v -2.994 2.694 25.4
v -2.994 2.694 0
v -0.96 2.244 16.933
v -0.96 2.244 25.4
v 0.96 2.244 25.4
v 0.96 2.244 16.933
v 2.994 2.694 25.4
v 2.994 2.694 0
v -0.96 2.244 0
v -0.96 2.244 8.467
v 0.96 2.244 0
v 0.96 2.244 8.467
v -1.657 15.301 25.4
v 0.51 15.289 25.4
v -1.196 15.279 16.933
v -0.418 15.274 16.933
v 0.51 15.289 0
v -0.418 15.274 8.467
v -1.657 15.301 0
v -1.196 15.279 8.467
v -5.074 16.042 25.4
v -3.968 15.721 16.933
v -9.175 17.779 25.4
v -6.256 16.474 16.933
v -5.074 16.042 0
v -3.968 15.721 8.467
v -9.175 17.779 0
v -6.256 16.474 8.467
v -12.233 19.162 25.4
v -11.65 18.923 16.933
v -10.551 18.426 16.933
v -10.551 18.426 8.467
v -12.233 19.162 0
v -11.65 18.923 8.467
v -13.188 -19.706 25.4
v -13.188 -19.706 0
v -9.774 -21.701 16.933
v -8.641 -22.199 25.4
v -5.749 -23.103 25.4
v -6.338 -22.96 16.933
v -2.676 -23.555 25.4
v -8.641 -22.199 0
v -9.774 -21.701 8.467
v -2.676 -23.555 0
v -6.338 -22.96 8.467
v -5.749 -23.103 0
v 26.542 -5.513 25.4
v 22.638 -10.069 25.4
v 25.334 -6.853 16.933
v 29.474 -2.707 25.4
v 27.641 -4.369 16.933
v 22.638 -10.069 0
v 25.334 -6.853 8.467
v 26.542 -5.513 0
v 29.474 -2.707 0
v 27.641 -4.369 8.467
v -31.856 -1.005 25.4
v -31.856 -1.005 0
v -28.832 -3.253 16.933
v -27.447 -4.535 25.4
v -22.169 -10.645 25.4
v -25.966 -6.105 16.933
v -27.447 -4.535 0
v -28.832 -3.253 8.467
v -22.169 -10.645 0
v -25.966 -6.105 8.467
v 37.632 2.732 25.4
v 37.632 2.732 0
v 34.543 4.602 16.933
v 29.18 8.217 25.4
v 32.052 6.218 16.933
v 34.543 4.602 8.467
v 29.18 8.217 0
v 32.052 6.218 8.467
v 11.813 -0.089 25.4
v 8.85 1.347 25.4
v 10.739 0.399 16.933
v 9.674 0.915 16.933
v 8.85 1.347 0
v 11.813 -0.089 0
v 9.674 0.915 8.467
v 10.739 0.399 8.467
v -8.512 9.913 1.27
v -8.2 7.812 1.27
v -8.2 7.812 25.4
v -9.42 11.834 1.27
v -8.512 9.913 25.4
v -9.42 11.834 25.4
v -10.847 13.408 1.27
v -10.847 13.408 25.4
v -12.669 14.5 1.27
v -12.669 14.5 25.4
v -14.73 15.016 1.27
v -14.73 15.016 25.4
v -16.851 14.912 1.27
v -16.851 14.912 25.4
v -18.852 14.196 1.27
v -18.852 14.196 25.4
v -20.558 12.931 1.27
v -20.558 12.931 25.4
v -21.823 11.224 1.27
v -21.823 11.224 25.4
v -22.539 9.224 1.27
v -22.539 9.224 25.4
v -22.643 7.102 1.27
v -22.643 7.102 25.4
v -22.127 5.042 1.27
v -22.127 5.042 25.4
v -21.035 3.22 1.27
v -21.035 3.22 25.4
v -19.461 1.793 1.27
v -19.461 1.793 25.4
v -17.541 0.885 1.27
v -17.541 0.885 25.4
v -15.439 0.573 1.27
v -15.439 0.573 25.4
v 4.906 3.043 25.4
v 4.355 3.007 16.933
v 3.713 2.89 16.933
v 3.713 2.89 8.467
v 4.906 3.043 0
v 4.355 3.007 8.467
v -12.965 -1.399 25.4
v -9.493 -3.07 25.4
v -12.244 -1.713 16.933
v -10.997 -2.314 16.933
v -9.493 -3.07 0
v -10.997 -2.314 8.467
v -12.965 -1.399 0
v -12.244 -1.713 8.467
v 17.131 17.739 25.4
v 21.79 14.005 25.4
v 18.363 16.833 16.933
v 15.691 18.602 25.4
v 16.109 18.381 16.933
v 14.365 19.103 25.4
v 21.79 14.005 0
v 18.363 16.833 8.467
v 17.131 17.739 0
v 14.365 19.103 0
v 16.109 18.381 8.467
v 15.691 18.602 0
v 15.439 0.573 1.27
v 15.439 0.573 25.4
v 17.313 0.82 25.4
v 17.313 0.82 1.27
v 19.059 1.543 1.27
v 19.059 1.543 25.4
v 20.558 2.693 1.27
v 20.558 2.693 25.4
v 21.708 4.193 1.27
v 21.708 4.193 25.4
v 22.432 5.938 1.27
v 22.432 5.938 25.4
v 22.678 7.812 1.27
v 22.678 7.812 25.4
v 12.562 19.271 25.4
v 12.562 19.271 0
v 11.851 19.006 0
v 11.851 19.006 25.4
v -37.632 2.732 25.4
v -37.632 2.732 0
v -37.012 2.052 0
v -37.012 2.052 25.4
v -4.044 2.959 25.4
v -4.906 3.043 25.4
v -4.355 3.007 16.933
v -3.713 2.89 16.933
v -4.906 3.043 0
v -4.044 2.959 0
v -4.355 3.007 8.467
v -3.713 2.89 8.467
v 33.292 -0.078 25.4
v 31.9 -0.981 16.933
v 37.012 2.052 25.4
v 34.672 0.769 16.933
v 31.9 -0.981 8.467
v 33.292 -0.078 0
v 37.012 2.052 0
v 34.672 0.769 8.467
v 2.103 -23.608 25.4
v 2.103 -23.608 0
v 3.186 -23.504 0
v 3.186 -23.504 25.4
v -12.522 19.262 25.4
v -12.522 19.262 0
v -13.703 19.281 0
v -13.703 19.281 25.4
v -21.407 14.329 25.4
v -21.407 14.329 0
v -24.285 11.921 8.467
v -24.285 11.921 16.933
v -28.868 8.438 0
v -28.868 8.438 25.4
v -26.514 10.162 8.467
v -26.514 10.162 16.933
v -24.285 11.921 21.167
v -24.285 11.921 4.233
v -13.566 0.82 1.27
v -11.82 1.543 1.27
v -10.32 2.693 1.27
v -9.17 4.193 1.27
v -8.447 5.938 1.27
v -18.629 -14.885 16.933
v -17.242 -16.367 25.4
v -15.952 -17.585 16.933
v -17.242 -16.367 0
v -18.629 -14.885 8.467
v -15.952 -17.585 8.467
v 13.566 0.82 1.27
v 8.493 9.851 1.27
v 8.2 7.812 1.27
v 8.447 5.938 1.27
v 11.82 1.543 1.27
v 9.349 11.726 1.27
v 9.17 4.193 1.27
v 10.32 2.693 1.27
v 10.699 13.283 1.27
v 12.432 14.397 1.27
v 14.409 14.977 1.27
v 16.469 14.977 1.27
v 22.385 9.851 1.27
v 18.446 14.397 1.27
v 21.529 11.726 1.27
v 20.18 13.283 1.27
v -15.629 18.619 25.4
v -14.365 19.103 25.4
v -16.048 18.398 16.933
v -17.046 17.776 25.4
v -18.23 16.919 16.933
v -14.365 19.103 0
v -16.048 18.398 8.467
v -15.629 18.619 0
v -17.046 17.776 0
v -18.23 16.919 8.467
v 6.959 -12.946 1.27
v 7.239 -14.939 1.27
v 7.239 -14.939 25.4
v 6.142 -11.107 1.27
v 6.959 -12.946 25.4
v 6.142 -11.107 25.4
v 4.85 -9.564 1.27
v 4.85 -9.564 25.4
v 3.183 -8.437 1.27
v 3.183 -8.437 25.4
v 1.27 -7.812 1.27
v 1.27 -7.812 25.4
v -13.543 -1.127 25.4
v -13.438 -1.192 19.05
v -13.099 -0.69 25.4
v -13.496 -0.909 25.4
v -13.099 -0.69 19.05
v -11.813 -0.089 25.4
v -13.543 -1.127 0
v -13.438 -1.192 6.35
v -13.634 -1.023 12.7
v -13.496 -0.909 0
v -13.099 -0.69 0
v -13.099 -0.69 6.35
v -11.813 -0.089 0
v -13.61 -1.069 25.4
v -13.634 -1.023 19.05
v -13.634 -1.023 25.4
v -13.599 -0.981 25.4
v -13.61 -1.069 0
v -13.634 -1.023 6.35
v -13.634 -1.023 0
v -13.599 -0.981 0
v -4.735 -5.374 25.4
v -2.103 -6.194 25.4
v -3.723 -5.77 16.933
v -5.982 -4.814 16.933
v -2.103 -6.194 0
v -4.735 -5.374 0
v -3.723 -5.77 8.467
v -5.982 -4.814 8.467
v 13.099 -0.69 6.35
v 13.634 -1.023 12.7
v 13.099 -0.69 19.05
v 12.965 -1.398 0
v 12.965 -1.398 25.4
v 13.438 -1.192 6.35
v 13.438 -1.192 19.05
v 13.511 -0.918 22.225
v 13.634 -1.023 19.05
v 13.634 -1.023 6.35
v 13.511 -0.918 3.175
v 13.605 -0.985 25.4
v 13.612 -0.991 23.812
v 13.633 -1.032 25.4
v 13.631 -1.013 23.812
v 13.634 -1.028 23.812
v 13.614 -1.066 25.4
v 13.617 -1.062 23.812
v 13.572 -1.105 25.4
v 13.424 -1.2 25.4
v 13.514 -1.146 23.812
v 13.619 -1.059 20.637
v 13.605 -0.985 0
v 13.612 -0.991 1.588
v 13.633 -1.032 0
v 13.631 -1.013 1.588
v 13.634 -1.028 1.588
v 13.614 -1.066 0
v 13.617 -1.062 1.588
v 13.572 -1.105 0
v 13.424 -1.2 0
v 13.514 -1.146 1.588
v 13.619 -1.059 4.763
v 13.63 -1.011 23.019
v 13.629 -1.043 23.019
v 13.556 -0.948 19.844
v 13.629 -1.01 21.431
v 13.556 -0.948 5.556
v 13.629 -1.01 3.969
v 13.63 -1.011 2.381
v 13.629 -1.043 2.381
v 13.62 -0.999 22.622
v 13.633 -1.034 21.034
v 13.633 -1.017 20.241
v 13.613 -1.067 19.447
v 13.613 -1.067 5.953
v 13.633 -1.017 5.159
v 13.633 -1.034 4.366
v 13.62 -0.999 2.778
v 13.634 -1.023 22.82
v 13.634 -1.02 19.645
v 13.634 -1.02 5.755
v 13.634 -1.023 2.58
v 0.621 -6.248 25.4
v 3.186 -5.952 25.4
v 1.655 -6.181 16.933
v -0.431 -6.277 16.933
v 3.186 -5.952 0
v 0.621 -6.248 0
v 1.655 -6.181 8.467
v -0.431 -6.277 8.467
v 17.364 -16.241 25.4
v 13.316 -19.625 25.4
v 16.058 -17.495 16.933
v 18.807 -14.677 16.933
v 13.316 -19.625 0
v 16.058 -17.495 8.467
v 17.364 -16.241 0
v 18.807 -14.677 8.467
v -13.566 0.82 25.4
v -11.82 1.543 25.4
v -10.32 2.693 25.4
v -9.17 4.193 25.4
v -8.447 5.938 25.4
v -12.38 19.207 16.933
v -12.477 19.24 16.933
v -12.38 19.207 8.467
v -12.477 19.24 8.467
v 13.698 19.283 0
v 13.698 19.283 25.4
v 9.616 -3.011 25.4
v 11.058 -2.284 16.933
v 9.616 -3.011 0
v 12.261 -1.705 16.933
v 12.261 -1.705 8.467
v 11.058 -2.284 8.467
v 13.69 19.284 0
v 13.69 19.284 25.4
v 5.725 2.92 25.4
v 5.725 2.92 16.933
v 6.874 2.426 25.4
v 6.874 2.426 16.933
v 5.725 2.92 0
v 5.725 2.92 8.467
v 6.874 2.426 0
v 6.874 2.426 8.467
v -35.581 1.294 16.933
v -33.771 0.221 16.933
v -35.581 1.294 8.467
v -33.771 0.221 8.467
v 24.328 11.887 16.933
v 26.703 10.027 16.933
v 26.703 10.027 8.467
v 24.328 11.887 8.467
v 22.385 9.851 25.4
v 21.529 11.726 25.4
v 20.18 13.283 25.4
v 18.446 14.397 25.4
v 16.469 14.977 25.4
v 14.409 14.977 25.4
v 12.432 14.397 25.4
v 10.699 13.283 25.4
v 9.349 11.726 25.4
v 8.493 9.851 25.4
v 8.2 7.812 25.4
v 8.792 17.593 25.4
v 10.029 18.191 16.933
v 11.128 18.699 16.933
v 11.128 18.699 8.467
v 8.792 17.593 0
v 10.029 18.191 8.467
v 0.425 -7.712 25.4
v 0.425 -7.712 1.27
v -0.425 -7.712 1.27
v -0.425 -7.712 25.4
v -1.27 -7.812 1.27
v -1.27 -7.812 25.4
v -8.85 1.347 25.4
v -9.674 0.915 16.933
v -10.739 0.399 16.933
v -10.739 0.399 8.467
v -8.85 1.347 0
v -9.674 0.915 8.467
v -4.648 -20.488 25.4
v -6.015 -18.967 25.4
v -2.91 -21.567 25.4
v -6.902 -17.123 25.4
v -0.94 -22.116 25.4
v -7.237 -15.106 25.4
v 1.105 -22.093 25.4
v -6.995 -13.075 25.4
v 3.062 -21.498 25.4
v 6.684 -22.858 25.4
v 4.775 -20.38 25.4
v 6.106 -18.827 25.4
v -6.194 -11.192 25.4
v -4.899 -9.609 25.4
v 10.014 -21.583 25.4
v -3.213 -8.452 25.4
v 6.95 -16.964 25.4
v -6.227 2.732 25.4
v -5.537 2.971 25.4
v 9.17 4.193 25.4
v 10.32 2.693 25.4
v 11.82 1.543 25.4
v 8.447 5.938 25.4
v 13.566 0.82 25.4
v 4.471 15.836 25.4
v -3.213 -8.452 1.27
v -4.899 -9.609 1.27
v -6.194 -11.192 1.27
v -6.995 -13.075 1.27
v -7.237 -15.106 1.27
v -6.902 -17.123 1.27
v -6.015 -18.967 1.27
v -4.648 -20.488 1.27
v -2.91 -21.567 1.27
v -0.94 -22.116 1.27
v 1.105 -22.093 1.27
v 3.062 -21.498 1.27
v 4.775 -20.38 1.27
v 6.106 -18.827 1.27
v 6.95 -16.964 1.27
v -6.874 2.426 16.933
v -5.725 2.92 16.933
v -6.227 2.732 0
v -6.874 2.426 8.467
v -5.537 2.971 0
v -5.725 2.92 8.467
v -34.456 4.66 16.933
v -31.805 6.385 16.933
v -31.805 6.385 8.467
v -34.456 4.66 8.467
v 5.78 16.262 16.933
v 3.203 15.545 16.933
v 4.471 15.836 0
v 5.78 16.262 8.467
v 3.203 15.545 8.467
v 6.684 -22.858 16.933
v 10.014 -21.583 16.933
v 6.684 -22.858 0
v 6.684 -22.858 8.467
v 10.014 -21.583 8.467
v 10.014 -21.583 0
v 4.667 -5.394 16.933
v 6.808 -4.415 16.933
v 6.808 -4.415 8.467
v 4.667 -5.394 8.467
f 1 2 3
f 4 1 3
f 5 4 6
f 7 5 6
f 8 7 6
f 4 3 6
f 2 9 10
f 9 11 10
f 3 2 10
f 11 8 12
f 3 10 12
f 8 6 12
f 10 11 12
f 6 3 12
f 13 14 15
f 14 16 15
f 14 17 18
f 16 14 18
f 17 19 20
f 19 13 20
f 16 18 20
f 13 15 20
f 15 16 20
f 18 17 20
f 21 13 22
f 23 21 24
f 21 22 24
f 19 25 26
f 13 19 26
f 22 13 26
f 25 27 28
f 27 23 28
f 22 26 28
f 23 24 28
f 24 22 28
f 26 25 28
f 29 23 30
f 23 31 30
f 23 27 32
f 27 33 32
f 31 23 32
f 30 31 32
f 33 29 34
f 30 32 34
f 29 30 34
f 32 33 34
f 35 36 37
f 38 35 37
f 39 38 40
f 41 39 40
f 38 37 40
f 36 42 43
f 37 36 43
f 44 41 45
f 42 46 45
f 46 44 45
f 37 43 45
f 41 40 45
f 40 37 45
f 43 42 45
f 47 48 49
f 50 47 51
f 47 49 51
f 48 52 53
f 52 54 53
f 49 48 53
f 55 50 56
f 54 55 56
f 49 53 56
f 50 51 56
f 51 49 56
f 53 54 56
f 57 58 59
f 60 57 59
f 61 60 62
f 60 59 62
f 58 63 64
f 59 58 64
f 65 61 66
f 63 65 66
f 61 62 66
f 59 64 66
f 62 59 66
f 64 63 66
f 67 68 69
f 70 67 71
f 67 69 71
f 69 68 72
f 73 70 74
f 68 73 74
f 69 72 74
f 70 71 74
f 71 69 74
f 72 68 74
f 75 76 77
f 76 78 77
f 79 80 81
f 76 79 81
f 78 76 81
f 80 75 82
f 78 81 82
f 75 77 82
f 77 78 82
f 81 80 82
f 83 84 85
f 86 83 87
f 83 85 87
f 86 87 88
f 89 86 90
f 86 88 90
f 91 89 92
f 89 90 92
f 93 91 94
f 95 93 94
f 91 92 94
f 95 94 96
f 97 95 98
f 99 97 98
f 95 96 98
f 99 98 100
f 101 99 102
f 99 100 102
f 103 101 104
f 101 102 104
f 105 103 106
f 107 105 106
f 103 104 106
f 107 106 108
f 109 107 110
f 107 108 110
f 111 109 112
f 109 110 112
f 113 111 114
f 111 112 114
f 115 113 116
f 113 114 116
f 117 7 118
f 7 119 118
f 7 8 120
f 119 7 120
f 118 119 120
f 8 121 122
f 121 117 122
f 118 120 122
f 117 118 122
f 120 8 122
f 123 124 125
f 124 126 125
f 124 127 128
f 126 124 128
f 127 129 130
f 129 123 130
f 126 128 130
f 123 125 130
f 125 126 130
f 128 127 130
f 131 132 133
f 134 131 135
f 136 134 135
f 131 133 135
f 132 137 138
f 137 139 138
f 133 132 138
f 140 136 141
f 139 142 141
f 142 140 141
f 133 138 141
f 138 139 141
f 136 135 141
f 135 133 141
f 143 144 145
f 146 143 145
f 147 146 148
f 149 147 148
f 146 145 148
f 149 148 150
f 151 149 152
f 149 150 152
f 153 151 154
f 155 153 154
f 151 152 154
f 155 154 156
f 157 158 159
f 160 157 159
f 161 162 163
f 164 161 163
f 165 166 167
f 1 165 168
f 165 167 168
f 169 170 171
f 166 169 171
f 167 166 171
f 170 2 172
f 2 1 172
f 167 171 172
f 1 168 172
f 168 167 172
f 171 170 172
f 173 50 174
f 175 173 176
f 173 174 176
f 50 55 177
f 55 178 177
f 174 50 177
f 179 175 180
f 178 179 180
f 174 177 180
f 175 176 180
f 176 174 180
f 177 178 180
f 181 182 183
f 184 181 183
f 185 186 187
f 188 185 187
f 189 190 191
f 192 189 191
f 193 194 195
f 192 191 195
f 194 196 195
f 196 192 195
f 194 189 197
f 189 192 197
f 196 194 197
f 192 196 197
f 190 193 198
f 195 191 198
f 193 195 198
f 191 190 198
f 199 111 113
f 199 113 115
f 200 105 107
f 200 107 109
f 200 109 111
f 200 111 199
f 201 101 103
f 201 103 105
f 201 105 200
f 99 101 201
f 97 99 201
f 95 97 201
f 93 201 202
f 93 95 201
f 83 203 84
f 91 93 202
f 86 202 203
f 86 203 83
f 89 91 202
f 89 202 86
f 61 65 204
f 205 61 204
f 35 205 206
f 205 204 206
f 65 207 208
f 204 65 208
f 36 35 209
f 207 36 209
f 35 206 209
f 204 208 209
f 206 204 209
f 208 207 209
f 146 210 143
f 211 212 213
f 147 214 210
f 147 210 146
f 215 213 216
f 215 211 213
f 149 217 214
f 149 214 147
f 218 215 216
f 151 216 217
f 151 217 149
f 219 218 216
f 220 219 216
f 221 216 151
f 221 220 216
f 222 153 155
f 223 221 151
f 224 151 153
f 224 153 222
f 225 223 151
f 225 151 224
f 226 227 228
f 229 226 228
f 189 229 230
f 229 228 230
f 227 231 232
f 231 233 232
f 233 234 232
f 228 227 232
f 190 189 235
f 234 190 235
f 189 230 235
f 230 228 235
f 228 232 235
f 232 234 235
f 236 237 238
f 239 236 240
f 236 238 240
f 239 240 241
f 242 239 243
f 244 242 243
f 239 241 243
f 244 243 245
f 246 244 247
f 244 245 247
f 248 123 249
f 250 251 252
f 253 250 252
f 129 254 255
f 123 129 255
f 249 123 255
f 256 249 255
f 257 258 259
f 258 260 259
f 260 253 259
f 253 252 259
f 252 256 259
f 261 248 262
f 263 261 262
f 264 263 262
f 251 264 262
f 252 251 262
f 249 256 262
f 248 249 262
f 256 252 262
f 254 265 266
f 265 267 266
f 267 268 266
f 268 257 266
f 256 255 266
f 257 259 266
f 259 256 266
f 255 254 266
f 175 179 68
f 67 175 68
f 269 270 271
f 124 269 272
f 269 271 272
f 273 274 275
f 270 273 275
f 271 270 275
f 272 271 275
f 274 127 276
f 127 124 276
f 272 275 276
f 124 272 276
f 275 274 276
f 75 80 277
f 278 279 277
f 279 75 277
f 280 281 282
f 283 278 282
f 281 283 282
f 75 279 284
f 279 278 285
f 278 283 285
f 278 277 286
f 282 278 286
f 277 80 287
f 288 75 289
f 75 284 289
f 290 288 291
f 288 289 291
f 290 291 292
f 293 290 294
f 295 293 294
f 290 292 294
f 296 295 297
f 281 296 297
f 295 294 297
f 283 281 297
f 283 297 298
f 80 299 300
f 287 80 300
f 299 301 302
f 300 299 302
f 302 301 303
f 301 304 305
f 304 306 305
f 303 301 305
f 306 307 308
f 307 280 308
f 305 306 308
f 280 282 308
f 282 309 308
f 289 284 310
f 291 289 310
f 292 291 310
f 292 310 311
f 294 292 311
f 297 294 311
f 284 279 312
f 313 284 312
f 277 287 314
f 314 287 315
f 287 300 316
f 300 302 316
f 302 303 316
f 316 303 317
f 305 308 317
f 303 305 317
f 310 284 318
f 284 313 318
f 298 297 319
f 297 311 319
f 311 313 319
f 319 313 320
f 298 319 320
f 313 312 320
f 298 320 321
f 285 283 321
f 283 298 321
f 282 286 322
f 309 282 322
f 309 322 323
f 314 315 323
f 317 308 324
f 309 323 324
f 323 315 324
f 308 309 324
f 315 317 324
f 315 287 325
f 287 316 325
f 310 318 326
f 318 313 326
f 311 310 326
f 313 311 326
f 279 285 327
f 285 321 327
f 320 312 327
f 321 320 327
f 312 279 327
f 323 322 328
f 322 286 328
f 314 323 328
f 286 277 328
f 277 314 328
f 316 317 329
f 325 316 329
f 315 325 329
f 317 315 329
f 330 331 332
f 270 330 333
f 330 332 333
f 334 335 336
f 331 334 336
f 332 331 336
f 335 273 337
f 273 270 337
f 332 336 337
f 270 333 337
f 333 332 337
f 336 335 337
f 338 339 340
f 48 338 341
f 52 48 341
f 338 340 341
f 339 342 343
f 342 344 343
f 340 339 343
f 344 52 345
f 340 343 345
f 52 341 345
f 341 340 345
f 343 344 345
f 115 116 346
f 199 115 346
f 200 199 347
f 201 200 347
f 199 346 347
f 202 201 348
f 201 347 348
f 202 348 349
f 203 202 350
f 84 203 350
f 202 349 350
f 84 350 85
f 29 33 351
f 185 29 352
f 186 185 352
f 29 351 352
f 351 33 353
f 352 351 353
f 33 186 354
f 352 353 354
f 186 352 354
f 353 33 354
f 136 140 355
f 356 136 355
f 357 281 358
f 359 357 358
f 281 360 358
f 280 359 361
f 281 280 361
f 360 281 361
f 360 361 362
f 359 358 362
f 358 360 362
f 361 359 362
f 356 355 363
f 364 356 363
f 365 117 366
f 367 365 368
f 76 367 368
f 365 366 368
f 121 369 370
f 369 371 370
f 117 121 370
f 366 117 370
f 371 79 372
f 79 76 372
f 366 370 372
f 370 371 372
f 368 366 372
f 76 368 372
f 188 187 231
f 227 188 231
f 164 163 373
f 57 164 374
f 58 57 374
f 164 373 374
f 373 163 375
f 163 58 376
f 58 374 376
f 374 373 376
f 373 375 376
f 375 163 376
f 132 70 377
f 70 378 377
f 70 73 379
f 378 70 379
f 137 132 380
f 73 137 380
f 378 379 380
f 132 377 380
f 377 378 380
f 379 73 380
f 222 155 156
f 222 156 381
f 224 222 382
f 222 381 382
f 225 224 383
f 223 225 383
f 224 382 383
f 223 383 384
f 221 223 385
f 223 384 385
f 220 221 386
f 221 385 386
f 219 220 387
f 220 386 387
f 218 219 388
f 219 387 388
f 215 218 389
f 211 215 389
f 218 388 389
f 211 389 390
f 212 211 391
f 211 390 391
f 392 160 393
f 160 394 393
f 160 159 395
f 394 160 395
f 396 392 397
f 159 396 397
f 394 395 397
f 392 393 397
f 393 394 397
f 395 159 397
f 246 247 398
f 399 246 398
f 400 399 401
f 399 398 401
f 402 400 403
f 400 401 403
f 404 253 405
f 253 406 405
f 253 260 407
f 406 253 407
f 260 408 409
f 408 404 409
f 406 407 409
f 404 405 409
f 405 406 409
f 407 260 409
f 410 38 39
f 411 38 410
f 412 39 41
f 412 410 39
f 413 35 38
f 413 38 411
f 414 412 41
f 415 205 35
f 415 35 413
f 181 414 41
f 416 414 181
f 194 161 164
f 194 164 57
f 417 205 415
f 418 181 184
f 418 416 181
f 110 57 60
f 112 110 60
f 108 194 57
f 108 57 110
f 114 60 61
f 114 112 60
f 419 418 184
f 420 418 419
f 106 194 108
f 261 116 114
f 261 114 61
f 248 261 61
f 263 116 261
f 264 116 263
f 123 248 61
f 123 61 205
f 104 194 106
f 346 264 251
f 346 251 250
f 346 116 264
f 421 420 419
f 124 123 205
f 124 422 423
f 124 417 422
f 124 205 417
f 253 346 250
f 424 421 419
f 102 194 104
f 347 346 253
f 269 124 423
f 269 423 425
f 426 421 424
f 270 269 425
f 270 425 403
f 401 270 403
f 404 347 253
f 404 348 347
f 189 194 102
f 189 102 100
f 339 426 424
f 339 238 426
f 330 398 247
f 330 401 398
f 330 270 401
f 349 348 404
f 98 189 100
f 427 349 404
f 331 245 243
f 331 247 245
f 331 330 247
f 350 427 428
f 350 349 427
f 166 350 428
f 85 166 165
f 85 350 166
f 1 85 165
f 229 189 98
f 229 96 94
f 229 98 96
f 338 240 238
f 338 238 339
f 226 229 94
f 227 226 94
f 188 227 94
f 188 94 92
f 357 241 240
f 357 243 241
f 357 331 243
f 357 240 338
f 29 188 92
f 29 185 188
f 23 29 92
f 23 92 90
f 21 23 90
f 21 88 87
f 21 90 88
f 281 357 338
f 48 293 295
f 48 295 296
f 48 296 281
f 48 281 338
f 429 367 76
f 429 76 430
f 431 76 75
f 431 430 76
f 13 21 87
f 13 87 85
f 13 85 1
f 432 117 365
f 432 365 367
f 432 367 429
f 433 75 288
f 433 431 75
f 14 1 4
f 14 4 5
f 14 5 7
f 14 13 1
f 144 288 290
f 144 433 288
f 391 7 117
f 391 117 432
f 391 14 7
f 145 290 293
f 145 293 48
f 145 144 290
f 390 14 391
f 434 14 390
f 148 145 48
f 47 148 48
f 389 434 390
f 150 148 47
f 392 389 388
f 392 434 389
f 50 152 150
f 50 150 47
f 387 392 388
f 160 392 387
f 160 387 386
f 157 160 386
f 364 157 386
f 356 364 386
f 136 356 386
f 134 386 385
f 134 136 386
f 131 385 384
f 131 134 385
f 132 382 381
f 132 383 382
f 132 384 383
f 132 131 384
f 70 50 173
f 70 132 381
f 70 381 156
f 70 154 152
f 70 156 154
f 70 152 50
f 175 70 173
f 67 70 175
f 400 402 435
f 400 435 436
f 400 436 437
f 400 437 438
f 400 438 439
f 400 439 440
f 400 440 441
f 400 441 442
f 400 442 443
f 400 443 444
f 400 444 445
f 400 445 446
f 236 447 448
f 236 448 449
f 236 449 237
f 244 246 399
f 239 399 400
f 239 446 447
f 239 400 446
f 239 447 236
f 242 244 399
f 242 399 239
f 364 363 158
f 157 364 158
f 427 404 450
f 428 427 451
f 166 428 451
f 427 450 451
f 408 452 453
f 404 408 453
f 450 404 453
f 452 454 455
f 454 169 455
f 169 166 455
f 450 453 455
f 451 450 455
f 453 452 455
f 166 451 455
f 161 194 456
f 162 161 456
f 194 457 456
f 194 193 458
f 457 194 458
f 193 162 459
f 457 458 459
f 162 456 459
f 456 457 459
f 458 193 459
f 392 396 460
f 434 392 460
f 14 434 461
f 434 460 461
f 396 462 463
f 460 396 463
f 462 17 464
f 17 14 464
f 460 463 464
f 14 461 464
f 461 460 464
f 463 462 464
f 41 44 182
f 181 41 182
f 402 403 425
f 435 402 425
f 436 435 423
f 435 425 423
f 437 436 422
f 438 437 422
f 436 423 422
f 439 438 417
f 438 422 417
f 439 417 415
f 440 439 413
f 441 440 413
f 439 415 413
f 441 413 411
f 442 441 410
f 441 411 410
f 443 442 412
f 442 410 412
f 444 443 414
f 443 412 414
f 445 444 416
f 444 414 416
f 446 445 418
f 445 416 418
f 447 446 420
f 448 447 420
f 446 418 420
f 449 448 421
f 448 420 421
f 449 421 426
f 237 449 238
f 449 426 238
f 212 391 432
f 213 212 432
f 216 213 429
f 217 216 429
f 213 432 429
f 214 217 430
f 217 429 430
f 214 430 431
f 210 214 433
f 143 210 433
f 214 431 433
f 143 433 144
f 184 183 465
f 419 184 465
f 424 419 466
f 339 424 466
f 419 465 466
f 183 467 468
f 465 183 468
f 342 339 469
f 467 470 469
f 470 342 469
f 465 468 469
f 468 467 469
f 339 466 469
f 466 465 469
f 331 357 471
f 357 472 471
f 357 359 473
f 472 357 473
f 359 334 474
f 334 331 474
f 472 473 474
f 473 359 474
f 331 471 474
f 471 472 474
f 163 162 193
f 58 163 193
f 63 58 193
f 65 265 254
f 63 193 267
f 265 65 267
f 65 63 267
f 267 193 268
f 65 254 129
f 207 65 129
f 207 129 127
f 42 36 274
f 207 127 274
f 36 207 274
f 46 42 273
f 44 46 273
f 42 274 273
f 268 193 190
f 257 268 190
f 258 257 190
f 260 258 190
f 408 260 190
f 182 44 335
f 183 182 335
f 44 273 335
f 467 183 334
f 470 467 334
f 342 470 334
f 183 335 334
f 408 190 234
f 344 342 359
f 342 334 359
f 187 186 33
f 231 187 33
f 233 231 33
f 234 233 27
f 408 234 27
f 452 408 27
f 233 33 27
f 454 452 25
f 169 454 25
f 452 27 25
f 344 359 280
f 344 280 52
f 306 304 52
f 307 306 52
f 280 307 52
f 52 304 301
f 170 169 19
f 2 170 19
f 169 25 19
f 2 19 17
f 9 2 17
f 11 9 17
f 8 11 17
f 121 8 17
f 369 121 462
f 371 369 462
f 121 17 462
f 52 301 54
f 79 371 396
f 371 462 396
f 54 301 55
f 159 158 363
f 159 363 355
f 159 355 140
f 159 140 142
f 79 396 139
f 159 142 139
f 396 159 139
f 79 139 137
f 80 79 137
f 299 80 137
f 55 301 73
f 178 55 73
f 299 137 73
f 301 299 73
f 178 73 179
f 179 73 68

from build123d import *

# Parameters (mm, degrees)
F1_DEPTH = 25.4
F2_R     = 7.239
F3_DEPTH = 24.13


# Not quite as in the source:
# - ends of sketch curves that miss each other by under 0.0002 mm in the source are joined


with BuildPart() as f1:
    # F0 (on Top) → F1 (new body)
    with BuildSketch(Plane.XY):
        with BuildLine():
            add(Edge.make_bspline(
                [(-13.1884615385, -19.7055979293), (-9.7172457191, -22.0951789594), (-6.5189125485, -23.2662965046), (-2.6759197324, -23.5549250296)],
                knots=[0, 0, 0, 0, 1, 1, 1, 1], degree=3))
            Line((-2.6759197324, -23.5549250296), (2.1025083612, -23.6077884611))
            Line((2.1025083612, -23.6077884611), (3.1856187291, -23.5036646015))
            add(Edge.make_bspline(
                [(3.1856187291, -23.5036646015), (6.8168163211, -23.15457813), (9.9794896756, -21.9435460564), (13.3158862876, -19.6246398892)],
                knots=[0, 0, 0, 0, 1, 1, 1, 1], degree=3))
            add(Edge.make_bspline(
                [(13.3158862876, -19.6246398892), (16.4115571605, -17.4730475146), (17.9082372943, -15.9389605714), (22.6381101873, -10.0694262069)],
                knots=[0, 0, 0, 0, 1, 1, 1, 1], degree=3))
            add(Edge.make_bspline(
                [(22.6381101873, -10.0694262069), (25.5016513946, -6.5159182102), (27.9048694214, -3.927799227), (29.4743562341, -2.7072102972)],
                knots=[0, 0, 0, 0, 1, 1, 1, 1], degree=3))
            add(Edge.make_bspline(
                [(29.4743562341, -2.7072102972), (31.4678692876, -1.1568550363), (35.1474296689, 1.1661975322), (37.0124718161, 2.0519014787)],
                knots=[0, 0, 0, 0, 1, 1, 1, 1], degree=3))
            Line((37.0124718161, 2.0519014787), (37.6322441338, 2.7317278065))
            add(Edge.make_bspline(
                [(37.6322441338, 2.7317278065), (33.9167308595, 4.9403402078), (32.5687337458, 5.8151659035), (29.1802675585, 8.2169048474)],
                knots=[0, 0, 0, 0, 1, 1, 1, 1], degree=3))
            add(Edge.make_bspline(
                [(29.1802675585, 8.2169048474), (26.5643967391, 10.0710303571), (24.4979457592, 11.6894900051), (21.789632107, 14.0053073964)],
                knots=[0, 0, 0, 0, 1, 1, 1, 1], degree=3))
            add(Edge.make_bspline(
                [(21.789632107, 14.0053073964), (17.557108204, 17.6244421652), (16.0735171405, 18.6431407559), (14.3652864381, 19.1031879026)],
                knots=[0, 0, 0, 0, 1, 1, 1, 1], degree=3))
            Line((14.3652864381, 19.1031879026), (13.6981605351, 19.2828529762))
            Line((13.6981605351, 19.2828529762), (13.6904819746, 19.2842043089))
            Line((13.6904819746, 19.2842043089), (12.5617656785, 19.2709062892))
            Line((12.5617656785, 19.2709062892), (11.8505016722, 19.0057804423))
            add(Edge.make_bspline(
                [(11.8505016722, 19.0057804423), (11.394958194, 18.8359751773), (10.018770903, 18.2002029302), (8.7923076923, 17.5929531204)],
                knots=[0, 0, 0, 0, 1, 1, 1, 1], degree=3))
            add(Edge.make_bspline(
                [(8.7923076923, 17.5929531204), (5.3799595585, 15.9034224779), (3.4433187191, 15.3647120515), (0.5096989967, 15.2890007254)],
                knots=[0, 0, 0, 0, 1, 1, 1, 1], degree=3))
            add(Edge.make_bspline(
                [(0.5096989967, 15.2890007254), (-0.4364297659, 15.2645829578), (-1.411229097, 15.2701955402), (-1.6565217391, 15.3014730598)],
                knots=[0, 0, 0, 0, 1, 1, 1, 1], degree=3))
            add(Edge.make_bspline(
                [(-1.6565217391, 15.3014730598), (-4.1988442676, 15.625649745), (-5.7211355017, 16.1272113972), (-9.1745819398, 17.7785107923)],
                knots=[0, 0, 0, 0, 1, 1, 1, 1], degree=3))
            add(Edge.make_bspline(
                [(-9.1745819398, 17.7785107923), (-10.6112959866, 18.4654896305), (-11.9874832776, 19.0880385335), (-12.2327759197, 19.1619526928)],
                knots=[0, 0, 0, 0, 1, 1, 1, 1], degree=3))
            add(Edge.make_bspline(
                [(-12.2327759197, 19.1619526928), (-12.4038425542, 19.2135003349), (-12.5045889513, 19.2450051824), (-12.5224971626, 19.2615668616)],
                knots=[0, 0, 0, 0, 0.4016092701, 0.4016092701, 0.4016092701, 0.4016092701], degree=3))
            Line((-12.5224971626, 19.2615668616), (-13.7034814285, 19.2814199953))
            Line((-13.7034814285, 19.2814199953), (-14.3652864381, 19.1031879026))
            add(Edge.make_bspline(
                [(-14.3652864381, 19.1031879026), (-15.9654584047, 18.6722420201), (-17.5656112575, 17.5873902337), (-21.4073578595, 14.3288910786)],
                knots=[0, 0, 0, 0, 1, 1, 1, 1], degree=3))
            add(Edge.make_bspline(
                [(-21.4073578595, 14.3288910786), (-24.8686676789, 11.3930710494), (-26.1926326442, 10.347677133), (-28.8684434285, 8.4376666326)],
                knots=[0, 0, 0, 0, 1, 1, 1, 1], degree=3))
            add(Edge.make_bspline(
                [(-28.8684434285, 8.4376666326), (-32.2200301856, 6.0452835322), (-33.9212185999, 4.9376719336), (-37.6322438152, 2.7317278065)],
                knots=[0, 0, 0, 0, 1, 1, 1, 1], degree=3))
            Line((-37.6322438152, 2.7317278065), (-37.0124719753, 2.0519014787))
            add(Edge.make_bspline(
                [(-37.0124719753, 2.0519014787), (-35.8599579657, 1.5045752279), (-33.7339199875, 0.2440615757), (-31.856187291, -1.0052246818)],
                knots=[0, 0, 0, 0, 1, 1, 1, 1], degree=3))
            add(Edge.make_bspline(
                [(-31.856187291, -1.0052246818), (-28.3890610096, -3.3119617855), (-26.7945040146, -4.8987439594), (-22.168989602, -10.6451911133)],
                knots=[0, 0, 0, 0, 1, 1, 1, 1], degree=3))
            add(Edge.make_bspline(
                [(-22.168989602, -10.6451911133), (-17.8793743144, -15.9743400531), (-16.3129253077, -17.5547216818), (-13.1884615385, -19.7055979293)],
                knots=[0, 0, 0, 0, 1, 1, 1, 1], degree=3))
        make_face()
        with BuildLine():
            add(Edge.make_bspline(
                [(3.1856187291, -5.9524701801), (2.2569598997, -6.2331244644), (-0.9628468896, -6.3803357286), (-2.1025083612, -6.1942458992)],
                knots=[0, 0, 0, 0, 1, 1, 1, 1], degree=3))
            add(Edge.make_bspline(
                [(-2.1025083612, -6.1942458992), (-3.6078737659, -5.9484422838), (-5.1525675452, -5.2953738791), (-9.4931438127, -3.0696215748)],
                knots=[0, 0, 0, 0, 1, 1, 1, 1], degree=3))
            add(Edge.make_bspline(
                [(-9.4931438127, -3.0696215748), (-11.0349832776, -2.2789994276), (-12.5975292642, -1.5271169527), (-12.9654682274, -1.3987709226)],
                knots=[0, 0, 0, 0, 1, 1, 1, 1], degree=3))
            add(Edge.make_bspline(
                [(-12.9654682274, -1.3987709226), (-13.3334071906, -1.2704261668), (-13.6344481605, -1.1015348557), (-13.6344481605, -1.0234578892)],
                knots=[0, 0, 0, 0, 1, 1, 1, 1], degree=3))
            add(Edge.make_bspline(
                [(-13.6344481605, -1.0234578892), (-13.6344481605, -0.9453809226), (-12.8145884047, -0.5248066183), (-11.8125380167, -0.0888470497)],
                knots=[0, 0, 0, 0, 1, 1, 1, 1], degree=3))
            add(Edge.make_bspline(
                [(-11.8125380167, -0.0888470497), (-10.810488903, 0.3471112446), (-9.4773074649, 0.9934414286), (-8.8499125987, 1.3474413985)],
                knots=[0, 0, 0, 0, 1, 1, 1, 1], degree=3))
            add(Edge.make_bspline(
                [(-8.8499125987, 1.3474413985), (-6.2956095953, 2.7886790239), (-5.7246919264, 3.0341564319), (-4.9058528428, 3.04326985)],
                knots=[0, 0, 0, 0, 1, 1, 1, 1], degree=3))
            add(Edge.make_bspline(
                [(-4.9058528428, 3.04326985), (-4.4052494247, 3.0488383115), (-3.7453867324, 2.9284155523), (-2.9944816054, 2.6944458734)],
                knots=[0, 0, 0, 0, 1, 1, 1, 1], degree=3))
            add(Edge.make_bspline(
                [(-2.9944816054, 2.6944458734), (-0.8245757458, 2.0183365255), (0.8245757458, 2.0183365255), (2.9944816054, 2.6944458734)],
                knots=[0, 0, 0, 0, 1, 1, 1, 1], degree=3))
            add(Edge.make_bspline(
                [(2.9944816054, 2.6944458734), (3.7453867324, 2.9284155523), (4.4052494247, 3.04884086), (4.9058528428, 3.04326985)],
                knots=[0, 0, 0, 0, 1, 1, 1, 1], degree=3))
            add(Edge.make_bspline(
                [(4.9058528428, 3.04326985), (5.7246919264, 3.0341589804), (6.2956095953, 2.7886790239), (8.8499125987, 1.3474413985)],
                knots=[0, 0, 0, 0, 1, 1, 1, 1], degree=3))
            add(Edge.make_bspline(
                [(8.8499125987, 1.3474413985), (9.4773074649, 0.9934414286), (10.810488903, 0.3471112446), (11.8125380167, -0.0888470497)],
                knots=[0, 0, 0, 0, 1, 1, 1, 1], degree=3))
            add(Edge.make_bspline(
                [(11.8125380167, -0.0888470497), (12.8145884047, -0.5248066183), (13.6344481605, -0.9453809226), (13.6344481605, -1.0234578892)],
                knots=[0, 0, 0, 0, 1, 1, 1, 1], degree=3))
            add(Edge.make_bspline(
                [(13.6344481605, -1.0234578892), (13.6344481605, -1.1015348557), (13.3334071906, -1.2702719828), (12.9654682274, -1.39842815)],
                knots=[0, 0, 0, 0, 1, 1, 1, 1], degree=3))
            add(Edge.make_bspline(
                [(12.9654682274, -1.39842815), (12.5975292642, -1.5265855915), (11.0903047324, -2.2520210597), (9.616079388, -3.0105054109)],
                knots=[0, 0, 0, 0, 1, 1, 1, 1], degree=3))
            add(Edge.make_bspline(
                [(9.616079388, -3.0105054109), (6.4728204682, -4.6277051467), (4.3392408562, -5.6038271467), (3.1856187291, -5.9524701801)],
                knots=[0, 0, 0, 0, 1, 1, 1, 1], degree=3))
        make_face(mode=Mode.SUBTRACT)
    extrude(amount=F1_DEPTH)

    # F2 (on face) → F3 (cut)
    with BuildSketch(Plane.XY.offset(25.4)):
        with BuildLine():
            Line((-15.4391787946, 0.5730026737), (-15.4391787946, 7.8120026737))
            Line((-15.4391787946, 7.8120026737), (-8.2001787946, 7.8120026737))
            ThreePointArc((-8.2001787946, 7.8120026737), (-20.5579247836, 12.9307486628), (-15.4391787946, 0.5730026737))
        make_face()
        with BuildLine():
            Line((-8.2001787946, 7.8120026737), (-15.4391787946, 7.8120026737))
            Line((-15.4391787946, 7.8120026737), (-15.4391787946, 0.5730026737))
            ThreePointArc((-15.4391787946, 0.5730026737), (-10.3204328056, 2.6932566847), (-8.2001787946, 7.8120026737))
        make_face()
        with BuildLine():
            ThreePointArc((5.2293543768, 16.0678049121), (0.0138821984, 18.3010974633), (-5.2101171545, 16.0878246774))
            add(Edge.make_bspline(
                [(-1.6565217391, 15.3014730598), (-2.9785522156, 15.4700478385), (-4.0247567323, 15.686589164), (-5.2101171545, 16.0878246774)],
                knots=[0, 0, 0, 0, 0.5200089531, 0.5200089531, 0.5200089531, 0.5200089531], degree=3))
            add(Edge.make_bspline(
                [(0.5096989967, 15.2890007254), (-0.4364297659, 15.2645829578), (-1.411229097, 15.2701955402), (-1.6565217391, 15.3014730598)],
                knots=[0, 0, 0, 0, 1, 1, 1, 1], degree=3))
            add(Edge.make_bspline(
                [(5.2293543768, 16.0678049121), (3.6603216323, 15.5449011909), (2.2630856254, 15.3342524074), (0.5096989967, 15.2890007254)],
                knots=[0.4023129122, 0.4023129122, 0.4023129122, 0.4023129122, 1, 1, 1, 1], degree=3))
        make_face()
        with BuildLine():
            add(Edge.make_bspline(
                [(-13.4162854763, -0.8613894905), (-13.1075898138, -0.6826431402), (-12.5033600683, -0.3894012805), (-11.8125380167, -0.0888470497)],
                knots=[0.3105915033, 0.3105915033, 0.3105915033, 0.3105915033, 1, 1, 1, 1], degree=3))
            ThreePointArc((-13.4162854763, -0.8613894905), (-11.8071303692, -1.5501063766), (-10.4103203839, -2.6049205653))
            add(Edge.make_bspline(
                [(-9.4931438127, -3.0696215748), (-9.8012757449, -2.911618141), (-10.1102346708, -2.7551619236), (-10.4103203839, -2.6049205653)],
                knots=[0, 0, 0, 0, 0.1998469615, 0.1998469615, 0.1998469615, 0.1998469615], degree=3))
            add(Edge.make_bspline(
                [(-2.1025083612, -6.1942458992), (-3.6078737659, -5.9484422838), (-5.1525675452, -5.2953738791), (-9.4931438127, -3.0696215748)],
                knots=[0, 0, 0, 0, 1, 1, 1, 1], degree=3))
            add(Edge.make_bspline(
                [(3.1856187291, -5.9524701801), (2.2569598997, -6.2331244644), (-0.9628468896, -6.3803357286), (-2.1025083612, -6.1942458992)],
                knots=[0, 0, 0, 0, 1, 1, 1, 1], degree=3))
            add(Edge.make_bspline(
                [(9.616079388, -3.0105054109), (6.4728204682, -4.6277051467), (4.3392408562, -5.6038271467), (3.1856187291, -5.9524701801)],
                knots=[0, 0, 0, 0, 1, 1, 1, 1], degree=3))
            add(Edge.make_bspline(
                [(10.4068537547, -2.6082707732), (10.1467262743, -2.7391031612), (9.8808705361, -2.8742711894), (9.616079388, -3.0105054109)],
                knots=[0.8203862462, 0.8203862462, 0.8203862462, 0.8203862462, 1, 1, 1, 1], degree=3))
            ThreePointArc((10.4068537547, -2.6082707732), (11.8050454626, -1.5513161359), (13.4162854763, -0.8613894905))
            add(Edge.make_bspline(
                [(11.8125380167, -0.0888470497), (12.5033600683, -0.3894012805), (13.1075898138, -0.6826431402), (13.4162854763, -0.8613894905)],
                knots=[0, 0, 0, 0, 0.6894084967, 0.6894084967, 0.6894084967, 0.6894084967], degree=3))
            add(Edge.make_bspline(
                [(8.8499125987, 1.3474413985), (9.4773074649, 0.9934414286), (10.810488903, 0.3471112446), (11.8125380167, -0.0888470497)],
                knots=[0, 0, 0, 0, 1, 1, 1, 1], degree=3))
            add(Edge.make_bspline(
                [(4.9058528428, 3.04326985), (5.7246919264, 3.0341589804), (6.2956095953, 2.7886790239), (8.8499125987, 1.3474413985)],
                knots=[0, 0, 0, 0, 1, 1, 1, 1], degree=3))
            add(Edge.make_bspline(
                [(2.9944816054, 2.6944458734), (3.7453867324, 2.9284155523), (4.4052494247, 3.04884086), (4.9058528428, 3.04326985)],
                knots=[0, 0, 0, 0, 1, 1, 1, 1], degree=3))
            add(Edge.make_bspline(
                [(-2.9944816054, 2.6944458734), (-0.8245757458, 2.0183365255), (0.8245757458, 2.0183365255), (2.9944816054, 2.6944458734)],
                knots=[0, 0, 0, 0, 1, 1, 1, 1], degree=3))
            add(Edge.make_bspline(
                [(-4.9058528428, 3.04326985), (-4.4052494247, 3.0488383115), (-3.7453867324, 2.9284155523), (-2.9944816054, 2.6944458734)],
                knots=[0, 0, 0, 0, 1, 1, 1, 1], degree=3))
            add(Edge.make_bspline(
                [(-8.8499125987, 1.3474413985), (-6.2956095953, 2.7886790239), (-5.7246919264, 3.0341564319), (-4.9058528428, 3.04326985)],
                knots=[0, 0, 0, 0, 1, 1, 1, 1], degree=3))
            add(Edge.make_bspline(
                [(-11.8125380167, -0.0888470497), (-10.810488903, 0.3471112446), (-9.4773074649, 0.9934414286), (-8.8499125987, 1.3474413985)],
                knots=[0, 0, 0, 0, 1, 1, 1, 1], degree=3))
        make_face()
        with BuildLine():
            ThreePointArc((-10.4103203839, -2.6049205653), (-11.8071303692, -1.5501063766), (-13.4162854763, -0.8613894905))
            add(Edge.make_bspline(
                [(-13.6344481605, -1.0234578892), (-13.6344481605, -0.9992078468), (-13.5553586823, -0.9419180856), (-13.4162854763, -0.8613894905)],
                knots=[0, 0, 0, 0, 0.3105915033, 0.3105915033, 0.3105915033, 0.3105915033], degree=3))
            add(Edge.make_bspline(
                [(-12.9654682274, -1.3987709226), (-13.3334071906, -1.2704261668), (-13.6344481605, -1.1015348557), (-13.6344481605, -1.0234578892)],
                knots=[0, 0, 0, 0, 1, 1, 1, 1], degree=3))
            add(Edge.make_bspline(
                [(-10.4103203839, -2.6049205653), (-11.6118122322, -2.003379874), (-12.671060748, -1.5014673886), (-12.9654682274, -1.3987709226)],
                knots=[0.1998469615, 0.1998469615, 0.1998469615, 0.1998469615, 1, 1, 1, 1], degree=3))
        make_face()
        with BuildLine():
            ThreePointArc((22.6781787946, 7.8120026737), (15.4391787946, 15.0510026737), (8.2001787946, 7.8120026737))
            Line((8.2001787946, 7.8120026737), (15.4391787946, 7.8120026737))
            Line((15.4391787946, 7.8120026737), (15.4391787946, 0.5730026737))
            ThreePointArc((15.4391787946, 0.5730026737), (20.5579247836, 2.6932566847), (22.6781787946, 7.8120026737))
        make_face()
        with BuildLine():
            Line((15.4391787946, 7.8120026737), (8.2001787946, 7.8120026737))
            ThreePointArc((8.2001787946, 7.8120026737), (10.3204328056, 2.6932566847), (15.4391787946, 0.5730026737))
            Line((15.4391787946, 0.5730026737), (15.4391787946, 7.8120026737))
        make_face()
        with BuildLine():
            ThreePointArc((1.2698828628, -7.8120026737), (0, -7.699749373), (-1.2698828628, -7.8120026737))
            Line((-1.2698828628, -7.8120026737), (1.2698828628, -7.8120026737))
        make_face()
        with BuildLine():
            Line((1.2698828628, -7.8120026737), (-1.2698828628, -7.8120026737))
            ThreePointArc((-1.2698828628, -7.8120026737), (-4.648141508, -20.4883350802), (7.239, -14.938749373))
            ThreePointArc((7.239, -14.938749373), (5.5495857072, -10.290607865), (1.2698828628, -7.8120026737))
        make_face()
        with BuildLine():
            add(Edge.make_bspline(
                [(13.4162854763, -0.8613894905), (13.5553586823, -0.9419180856), (13.6344481605, -0.9992078468), (13.6344481605, -1.0234578892)],
                knots=[0.6894084967, 0.6894084967, 0.6894084967, 0.6894084967, 1, 1, 1, 1], degree=3))
            ThreePointArc((13.4162854763, -0.8613894905), (11.8050454626, -1.5513161359), (10.4068537547, -2.6082707732))
            add(Edge.make_bspline(
                [(12.9654682274, -1.39842815), (12.6636161626, -1.5035667524), (11.5949866381, -2.010693531), (10.4068537547, -2.6082707732)],
                knots=[0, 0, 0, 0, 0.8203862462, 0.8203862462, 0.8203862462, 0.8203862462], degree=3))
            add(Edge.make_bspline(
                [(13.6344481605, -1.0234578892), (13.6344481605, -1.1015348557), (13.3334071906, -1.2702719828), (12.9654682274, -1.39842815)],
                knots=[0, 0, 0, 0, 1, 1, 1, 1], degree=3))
        make_face()
        with Locations((-53.0695078206, 0)):
            Circle(F2_R)
        with Locations((49.2036237652, 0)):
            Circle(F2_R)
    extrude(amount=-F3_DEPTH, mode=Mode.SUBTRACT)


solid = f1.part
